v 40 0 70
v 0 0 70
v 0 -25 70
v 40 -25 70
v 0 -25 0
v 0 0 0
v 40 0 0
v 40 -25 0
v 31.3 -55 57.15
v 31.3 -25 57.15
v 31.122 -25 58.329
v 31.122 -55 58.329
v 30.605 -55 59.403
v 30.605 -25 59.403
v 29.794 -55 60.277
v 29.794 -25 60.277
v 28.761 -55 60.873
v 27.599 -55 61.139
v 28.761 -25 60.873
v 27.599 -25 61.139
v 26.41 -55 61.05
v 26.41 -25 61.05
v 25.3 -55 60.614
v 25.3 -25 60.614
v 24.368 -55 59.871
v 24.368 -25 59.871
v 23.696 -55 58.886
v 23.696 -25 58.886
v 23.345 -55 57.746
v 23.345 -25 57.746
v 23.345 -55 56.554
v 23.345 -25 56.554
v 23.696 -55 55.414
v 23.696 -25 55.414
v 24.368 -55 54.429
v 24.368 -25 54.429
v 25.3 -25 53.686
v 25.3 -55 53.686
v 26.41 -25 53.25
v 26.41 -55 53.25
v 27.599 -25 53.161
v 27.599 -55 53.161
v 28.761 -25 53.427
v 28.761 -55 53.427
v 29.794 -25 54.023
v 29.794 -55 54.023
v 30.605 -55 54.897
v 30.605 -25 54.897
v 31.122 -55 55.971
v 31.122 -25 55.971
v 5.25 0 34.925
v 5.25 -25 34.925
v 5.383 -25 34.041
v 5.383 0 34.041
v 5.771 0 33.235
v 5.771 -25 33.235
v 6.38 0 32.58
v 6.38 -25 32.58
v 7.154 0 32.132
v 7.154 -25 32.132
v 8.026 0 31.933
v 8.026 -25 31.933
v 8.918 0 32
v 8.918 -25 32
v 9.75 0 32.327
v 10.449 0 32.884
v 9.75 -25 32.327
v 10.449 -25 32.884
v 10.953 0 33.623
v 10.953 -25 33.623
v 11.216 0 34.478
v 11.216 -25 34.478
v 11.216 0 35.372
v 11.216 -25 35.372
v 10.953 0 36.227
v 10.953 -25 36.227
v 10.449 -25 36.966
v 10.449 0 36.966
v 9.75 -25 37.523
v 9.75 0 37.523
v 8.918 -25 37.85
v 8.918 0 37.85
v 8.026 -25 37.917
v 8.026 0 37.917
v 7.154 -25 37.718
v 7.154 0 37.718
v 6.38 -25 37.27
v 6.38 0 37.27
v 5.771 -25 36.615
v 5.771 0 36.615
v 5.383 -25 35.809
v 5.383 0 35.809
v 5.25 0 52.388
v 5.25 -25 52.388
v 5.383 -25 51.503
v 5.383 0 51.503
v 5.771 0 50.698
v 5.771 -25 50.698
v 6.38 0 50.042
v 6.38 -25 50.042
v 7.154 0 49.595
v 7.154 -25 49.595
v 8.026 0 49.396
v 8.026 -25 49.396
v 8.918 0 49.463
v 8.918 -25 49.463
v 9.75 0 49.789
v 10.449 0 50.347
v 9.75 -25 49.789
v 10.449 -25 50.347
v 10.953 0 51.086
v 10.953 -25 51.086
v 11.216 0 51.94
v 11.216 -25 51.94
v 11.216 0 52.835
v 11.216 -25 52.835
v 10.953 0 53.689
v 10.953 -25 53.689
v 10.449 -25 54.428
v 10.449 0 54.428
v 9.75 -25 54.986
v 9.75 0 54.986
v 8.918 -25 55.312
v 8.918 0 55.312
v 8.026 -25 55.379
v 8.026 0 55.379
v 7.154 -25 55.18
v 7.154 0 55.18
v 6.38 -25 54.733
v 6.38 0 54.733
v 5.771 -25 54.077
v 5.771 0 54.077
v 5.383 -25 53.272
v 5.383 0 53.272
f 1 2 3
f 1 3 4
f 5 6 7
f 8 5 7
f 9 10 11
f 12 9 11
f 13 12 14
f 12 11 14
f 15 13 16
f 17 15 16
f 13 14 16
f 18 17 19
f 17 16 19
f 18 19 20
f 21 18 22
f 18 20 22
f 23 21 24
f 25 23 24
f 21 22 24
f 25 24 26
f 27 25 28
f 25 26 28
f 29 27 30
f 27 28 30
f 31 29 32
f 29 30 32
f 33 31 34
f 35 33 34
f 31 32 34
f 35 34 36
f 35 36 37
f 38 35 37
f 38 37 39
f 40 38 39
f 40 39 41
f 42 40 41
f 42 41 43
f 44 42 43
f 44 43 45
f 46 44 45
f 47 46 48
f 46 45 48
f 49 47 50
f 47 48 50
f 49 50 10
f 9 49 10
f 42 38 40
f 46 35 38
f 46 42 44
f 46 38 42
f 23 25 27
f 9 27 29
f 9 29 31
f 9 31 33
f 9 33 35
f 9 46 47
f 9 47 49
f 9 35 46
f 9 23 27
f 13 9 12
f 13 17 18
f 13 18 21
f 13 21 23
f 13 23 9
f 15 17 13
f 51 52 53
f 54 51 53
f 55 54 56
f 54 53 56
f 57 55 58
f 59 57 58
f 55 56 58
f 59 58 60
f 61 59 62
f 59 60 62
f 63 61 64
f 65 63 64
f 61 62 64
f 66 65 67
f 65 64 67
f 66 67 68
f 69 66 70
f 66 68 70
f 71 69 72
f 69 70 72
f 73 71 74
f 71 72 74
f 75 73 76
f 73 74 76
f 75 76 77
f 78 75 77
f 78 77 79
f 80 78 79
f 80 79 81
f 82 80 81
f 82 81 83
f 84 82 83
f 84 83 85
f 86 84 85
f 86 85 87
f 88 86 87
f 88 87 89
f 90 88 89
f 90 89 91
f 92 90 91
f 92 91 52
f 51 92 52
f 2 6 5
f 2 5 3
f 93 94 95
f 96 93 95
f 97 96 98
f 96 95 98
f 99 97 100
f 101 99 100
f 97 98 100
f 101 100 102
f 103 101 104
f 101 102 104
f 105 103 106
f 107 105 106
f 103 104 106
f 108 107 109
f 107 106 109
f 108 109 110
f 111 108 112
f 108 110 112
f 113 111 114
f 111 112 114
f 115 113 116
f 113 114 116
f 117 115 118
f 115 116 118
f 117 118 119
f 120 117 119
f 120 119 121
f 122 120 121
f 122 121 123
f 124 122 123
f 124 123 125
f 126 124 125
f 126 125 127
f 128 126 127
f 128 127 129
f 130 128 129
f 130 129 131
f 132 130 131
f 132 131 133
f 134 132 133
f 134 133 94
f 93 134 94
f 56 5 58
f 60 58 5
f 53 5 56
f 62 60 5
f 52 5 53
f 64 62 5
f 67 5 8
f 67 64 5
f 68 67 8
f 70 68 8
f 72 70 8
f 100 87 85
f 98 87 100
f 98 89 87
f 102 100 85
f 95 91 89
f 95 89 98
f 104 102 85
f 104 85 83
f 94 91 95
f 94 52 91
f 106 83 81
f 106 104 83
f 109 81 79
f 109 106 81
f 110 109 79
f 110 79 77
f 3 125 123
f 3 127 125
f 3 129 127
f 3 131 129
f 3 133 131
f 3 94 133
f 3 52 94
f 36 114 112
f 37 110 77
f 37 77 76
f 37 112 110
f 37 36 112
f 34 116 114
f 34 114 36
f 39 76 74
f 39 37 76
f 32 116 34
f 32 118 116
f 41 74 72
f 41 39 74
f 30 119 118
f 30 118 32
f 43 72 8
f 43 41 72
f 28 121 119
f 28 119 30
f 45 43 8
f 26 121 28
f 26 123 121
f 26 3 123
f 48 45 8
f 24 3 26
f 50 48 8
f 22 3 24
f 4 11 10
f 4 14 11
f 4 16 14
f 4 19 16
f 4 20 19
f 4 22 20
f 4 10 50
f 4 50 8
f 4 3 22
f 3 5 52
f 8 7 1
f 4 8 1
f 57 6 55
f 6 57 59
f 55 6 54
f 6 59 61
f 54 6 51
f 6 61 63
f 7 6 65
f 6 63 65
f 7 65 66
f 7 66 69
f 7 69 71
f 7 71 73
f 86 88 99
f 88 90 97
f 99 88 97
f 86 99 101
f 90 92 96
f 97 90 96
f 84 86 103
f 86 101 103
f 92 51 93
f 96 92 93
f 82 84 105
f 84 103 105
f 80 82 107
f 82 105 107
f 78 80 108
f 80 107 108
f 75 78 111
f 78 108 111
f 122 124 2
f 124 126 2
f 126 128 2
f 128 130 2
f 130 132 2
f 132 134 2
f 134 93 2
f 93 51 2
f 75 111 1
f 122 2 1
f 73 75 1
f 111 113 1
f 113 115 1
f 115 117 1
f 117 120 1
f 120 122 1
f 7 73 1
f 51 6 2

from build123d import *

# Parameters (mm, degrees)
F0_W     = 40
F0_H     = 70
F1_DEPTH = 25
F2_R     = 4
F3_DEPTH = 30
F6_D     = 6


# Not quite as in the source:
# - the program builds the solid bodies; features that only make, move or delete a surface that nothing else refers to are left out


with BuildPart() as f1:
    # F0 (on Front) → F1 (new body)
    with BuildSketch(Plane.XZ):
        with Locations((20, 35)):
            Rectangle(F0_W, F0_H)
    extrude(amount=F1_DEPTH)

    # F2 (on face) → F3 (join)
    with BuildSketch(Plane.XZ.offset(25)):
        with Locations((27.3, 57.15)):
            Circle(F2_R)
    extrude(amount=F3_DEPTH)

    # F6 (through all)
    with Locations(Plane(origin=(0, 0, 0), x_dir=(1, 0, 0), z_dir=(0, 1, 0))):
        with Locations((8.25, -52.3875), (8.25, -34.925)):
            Hole(F6_D / 2)


solid = f1.part
